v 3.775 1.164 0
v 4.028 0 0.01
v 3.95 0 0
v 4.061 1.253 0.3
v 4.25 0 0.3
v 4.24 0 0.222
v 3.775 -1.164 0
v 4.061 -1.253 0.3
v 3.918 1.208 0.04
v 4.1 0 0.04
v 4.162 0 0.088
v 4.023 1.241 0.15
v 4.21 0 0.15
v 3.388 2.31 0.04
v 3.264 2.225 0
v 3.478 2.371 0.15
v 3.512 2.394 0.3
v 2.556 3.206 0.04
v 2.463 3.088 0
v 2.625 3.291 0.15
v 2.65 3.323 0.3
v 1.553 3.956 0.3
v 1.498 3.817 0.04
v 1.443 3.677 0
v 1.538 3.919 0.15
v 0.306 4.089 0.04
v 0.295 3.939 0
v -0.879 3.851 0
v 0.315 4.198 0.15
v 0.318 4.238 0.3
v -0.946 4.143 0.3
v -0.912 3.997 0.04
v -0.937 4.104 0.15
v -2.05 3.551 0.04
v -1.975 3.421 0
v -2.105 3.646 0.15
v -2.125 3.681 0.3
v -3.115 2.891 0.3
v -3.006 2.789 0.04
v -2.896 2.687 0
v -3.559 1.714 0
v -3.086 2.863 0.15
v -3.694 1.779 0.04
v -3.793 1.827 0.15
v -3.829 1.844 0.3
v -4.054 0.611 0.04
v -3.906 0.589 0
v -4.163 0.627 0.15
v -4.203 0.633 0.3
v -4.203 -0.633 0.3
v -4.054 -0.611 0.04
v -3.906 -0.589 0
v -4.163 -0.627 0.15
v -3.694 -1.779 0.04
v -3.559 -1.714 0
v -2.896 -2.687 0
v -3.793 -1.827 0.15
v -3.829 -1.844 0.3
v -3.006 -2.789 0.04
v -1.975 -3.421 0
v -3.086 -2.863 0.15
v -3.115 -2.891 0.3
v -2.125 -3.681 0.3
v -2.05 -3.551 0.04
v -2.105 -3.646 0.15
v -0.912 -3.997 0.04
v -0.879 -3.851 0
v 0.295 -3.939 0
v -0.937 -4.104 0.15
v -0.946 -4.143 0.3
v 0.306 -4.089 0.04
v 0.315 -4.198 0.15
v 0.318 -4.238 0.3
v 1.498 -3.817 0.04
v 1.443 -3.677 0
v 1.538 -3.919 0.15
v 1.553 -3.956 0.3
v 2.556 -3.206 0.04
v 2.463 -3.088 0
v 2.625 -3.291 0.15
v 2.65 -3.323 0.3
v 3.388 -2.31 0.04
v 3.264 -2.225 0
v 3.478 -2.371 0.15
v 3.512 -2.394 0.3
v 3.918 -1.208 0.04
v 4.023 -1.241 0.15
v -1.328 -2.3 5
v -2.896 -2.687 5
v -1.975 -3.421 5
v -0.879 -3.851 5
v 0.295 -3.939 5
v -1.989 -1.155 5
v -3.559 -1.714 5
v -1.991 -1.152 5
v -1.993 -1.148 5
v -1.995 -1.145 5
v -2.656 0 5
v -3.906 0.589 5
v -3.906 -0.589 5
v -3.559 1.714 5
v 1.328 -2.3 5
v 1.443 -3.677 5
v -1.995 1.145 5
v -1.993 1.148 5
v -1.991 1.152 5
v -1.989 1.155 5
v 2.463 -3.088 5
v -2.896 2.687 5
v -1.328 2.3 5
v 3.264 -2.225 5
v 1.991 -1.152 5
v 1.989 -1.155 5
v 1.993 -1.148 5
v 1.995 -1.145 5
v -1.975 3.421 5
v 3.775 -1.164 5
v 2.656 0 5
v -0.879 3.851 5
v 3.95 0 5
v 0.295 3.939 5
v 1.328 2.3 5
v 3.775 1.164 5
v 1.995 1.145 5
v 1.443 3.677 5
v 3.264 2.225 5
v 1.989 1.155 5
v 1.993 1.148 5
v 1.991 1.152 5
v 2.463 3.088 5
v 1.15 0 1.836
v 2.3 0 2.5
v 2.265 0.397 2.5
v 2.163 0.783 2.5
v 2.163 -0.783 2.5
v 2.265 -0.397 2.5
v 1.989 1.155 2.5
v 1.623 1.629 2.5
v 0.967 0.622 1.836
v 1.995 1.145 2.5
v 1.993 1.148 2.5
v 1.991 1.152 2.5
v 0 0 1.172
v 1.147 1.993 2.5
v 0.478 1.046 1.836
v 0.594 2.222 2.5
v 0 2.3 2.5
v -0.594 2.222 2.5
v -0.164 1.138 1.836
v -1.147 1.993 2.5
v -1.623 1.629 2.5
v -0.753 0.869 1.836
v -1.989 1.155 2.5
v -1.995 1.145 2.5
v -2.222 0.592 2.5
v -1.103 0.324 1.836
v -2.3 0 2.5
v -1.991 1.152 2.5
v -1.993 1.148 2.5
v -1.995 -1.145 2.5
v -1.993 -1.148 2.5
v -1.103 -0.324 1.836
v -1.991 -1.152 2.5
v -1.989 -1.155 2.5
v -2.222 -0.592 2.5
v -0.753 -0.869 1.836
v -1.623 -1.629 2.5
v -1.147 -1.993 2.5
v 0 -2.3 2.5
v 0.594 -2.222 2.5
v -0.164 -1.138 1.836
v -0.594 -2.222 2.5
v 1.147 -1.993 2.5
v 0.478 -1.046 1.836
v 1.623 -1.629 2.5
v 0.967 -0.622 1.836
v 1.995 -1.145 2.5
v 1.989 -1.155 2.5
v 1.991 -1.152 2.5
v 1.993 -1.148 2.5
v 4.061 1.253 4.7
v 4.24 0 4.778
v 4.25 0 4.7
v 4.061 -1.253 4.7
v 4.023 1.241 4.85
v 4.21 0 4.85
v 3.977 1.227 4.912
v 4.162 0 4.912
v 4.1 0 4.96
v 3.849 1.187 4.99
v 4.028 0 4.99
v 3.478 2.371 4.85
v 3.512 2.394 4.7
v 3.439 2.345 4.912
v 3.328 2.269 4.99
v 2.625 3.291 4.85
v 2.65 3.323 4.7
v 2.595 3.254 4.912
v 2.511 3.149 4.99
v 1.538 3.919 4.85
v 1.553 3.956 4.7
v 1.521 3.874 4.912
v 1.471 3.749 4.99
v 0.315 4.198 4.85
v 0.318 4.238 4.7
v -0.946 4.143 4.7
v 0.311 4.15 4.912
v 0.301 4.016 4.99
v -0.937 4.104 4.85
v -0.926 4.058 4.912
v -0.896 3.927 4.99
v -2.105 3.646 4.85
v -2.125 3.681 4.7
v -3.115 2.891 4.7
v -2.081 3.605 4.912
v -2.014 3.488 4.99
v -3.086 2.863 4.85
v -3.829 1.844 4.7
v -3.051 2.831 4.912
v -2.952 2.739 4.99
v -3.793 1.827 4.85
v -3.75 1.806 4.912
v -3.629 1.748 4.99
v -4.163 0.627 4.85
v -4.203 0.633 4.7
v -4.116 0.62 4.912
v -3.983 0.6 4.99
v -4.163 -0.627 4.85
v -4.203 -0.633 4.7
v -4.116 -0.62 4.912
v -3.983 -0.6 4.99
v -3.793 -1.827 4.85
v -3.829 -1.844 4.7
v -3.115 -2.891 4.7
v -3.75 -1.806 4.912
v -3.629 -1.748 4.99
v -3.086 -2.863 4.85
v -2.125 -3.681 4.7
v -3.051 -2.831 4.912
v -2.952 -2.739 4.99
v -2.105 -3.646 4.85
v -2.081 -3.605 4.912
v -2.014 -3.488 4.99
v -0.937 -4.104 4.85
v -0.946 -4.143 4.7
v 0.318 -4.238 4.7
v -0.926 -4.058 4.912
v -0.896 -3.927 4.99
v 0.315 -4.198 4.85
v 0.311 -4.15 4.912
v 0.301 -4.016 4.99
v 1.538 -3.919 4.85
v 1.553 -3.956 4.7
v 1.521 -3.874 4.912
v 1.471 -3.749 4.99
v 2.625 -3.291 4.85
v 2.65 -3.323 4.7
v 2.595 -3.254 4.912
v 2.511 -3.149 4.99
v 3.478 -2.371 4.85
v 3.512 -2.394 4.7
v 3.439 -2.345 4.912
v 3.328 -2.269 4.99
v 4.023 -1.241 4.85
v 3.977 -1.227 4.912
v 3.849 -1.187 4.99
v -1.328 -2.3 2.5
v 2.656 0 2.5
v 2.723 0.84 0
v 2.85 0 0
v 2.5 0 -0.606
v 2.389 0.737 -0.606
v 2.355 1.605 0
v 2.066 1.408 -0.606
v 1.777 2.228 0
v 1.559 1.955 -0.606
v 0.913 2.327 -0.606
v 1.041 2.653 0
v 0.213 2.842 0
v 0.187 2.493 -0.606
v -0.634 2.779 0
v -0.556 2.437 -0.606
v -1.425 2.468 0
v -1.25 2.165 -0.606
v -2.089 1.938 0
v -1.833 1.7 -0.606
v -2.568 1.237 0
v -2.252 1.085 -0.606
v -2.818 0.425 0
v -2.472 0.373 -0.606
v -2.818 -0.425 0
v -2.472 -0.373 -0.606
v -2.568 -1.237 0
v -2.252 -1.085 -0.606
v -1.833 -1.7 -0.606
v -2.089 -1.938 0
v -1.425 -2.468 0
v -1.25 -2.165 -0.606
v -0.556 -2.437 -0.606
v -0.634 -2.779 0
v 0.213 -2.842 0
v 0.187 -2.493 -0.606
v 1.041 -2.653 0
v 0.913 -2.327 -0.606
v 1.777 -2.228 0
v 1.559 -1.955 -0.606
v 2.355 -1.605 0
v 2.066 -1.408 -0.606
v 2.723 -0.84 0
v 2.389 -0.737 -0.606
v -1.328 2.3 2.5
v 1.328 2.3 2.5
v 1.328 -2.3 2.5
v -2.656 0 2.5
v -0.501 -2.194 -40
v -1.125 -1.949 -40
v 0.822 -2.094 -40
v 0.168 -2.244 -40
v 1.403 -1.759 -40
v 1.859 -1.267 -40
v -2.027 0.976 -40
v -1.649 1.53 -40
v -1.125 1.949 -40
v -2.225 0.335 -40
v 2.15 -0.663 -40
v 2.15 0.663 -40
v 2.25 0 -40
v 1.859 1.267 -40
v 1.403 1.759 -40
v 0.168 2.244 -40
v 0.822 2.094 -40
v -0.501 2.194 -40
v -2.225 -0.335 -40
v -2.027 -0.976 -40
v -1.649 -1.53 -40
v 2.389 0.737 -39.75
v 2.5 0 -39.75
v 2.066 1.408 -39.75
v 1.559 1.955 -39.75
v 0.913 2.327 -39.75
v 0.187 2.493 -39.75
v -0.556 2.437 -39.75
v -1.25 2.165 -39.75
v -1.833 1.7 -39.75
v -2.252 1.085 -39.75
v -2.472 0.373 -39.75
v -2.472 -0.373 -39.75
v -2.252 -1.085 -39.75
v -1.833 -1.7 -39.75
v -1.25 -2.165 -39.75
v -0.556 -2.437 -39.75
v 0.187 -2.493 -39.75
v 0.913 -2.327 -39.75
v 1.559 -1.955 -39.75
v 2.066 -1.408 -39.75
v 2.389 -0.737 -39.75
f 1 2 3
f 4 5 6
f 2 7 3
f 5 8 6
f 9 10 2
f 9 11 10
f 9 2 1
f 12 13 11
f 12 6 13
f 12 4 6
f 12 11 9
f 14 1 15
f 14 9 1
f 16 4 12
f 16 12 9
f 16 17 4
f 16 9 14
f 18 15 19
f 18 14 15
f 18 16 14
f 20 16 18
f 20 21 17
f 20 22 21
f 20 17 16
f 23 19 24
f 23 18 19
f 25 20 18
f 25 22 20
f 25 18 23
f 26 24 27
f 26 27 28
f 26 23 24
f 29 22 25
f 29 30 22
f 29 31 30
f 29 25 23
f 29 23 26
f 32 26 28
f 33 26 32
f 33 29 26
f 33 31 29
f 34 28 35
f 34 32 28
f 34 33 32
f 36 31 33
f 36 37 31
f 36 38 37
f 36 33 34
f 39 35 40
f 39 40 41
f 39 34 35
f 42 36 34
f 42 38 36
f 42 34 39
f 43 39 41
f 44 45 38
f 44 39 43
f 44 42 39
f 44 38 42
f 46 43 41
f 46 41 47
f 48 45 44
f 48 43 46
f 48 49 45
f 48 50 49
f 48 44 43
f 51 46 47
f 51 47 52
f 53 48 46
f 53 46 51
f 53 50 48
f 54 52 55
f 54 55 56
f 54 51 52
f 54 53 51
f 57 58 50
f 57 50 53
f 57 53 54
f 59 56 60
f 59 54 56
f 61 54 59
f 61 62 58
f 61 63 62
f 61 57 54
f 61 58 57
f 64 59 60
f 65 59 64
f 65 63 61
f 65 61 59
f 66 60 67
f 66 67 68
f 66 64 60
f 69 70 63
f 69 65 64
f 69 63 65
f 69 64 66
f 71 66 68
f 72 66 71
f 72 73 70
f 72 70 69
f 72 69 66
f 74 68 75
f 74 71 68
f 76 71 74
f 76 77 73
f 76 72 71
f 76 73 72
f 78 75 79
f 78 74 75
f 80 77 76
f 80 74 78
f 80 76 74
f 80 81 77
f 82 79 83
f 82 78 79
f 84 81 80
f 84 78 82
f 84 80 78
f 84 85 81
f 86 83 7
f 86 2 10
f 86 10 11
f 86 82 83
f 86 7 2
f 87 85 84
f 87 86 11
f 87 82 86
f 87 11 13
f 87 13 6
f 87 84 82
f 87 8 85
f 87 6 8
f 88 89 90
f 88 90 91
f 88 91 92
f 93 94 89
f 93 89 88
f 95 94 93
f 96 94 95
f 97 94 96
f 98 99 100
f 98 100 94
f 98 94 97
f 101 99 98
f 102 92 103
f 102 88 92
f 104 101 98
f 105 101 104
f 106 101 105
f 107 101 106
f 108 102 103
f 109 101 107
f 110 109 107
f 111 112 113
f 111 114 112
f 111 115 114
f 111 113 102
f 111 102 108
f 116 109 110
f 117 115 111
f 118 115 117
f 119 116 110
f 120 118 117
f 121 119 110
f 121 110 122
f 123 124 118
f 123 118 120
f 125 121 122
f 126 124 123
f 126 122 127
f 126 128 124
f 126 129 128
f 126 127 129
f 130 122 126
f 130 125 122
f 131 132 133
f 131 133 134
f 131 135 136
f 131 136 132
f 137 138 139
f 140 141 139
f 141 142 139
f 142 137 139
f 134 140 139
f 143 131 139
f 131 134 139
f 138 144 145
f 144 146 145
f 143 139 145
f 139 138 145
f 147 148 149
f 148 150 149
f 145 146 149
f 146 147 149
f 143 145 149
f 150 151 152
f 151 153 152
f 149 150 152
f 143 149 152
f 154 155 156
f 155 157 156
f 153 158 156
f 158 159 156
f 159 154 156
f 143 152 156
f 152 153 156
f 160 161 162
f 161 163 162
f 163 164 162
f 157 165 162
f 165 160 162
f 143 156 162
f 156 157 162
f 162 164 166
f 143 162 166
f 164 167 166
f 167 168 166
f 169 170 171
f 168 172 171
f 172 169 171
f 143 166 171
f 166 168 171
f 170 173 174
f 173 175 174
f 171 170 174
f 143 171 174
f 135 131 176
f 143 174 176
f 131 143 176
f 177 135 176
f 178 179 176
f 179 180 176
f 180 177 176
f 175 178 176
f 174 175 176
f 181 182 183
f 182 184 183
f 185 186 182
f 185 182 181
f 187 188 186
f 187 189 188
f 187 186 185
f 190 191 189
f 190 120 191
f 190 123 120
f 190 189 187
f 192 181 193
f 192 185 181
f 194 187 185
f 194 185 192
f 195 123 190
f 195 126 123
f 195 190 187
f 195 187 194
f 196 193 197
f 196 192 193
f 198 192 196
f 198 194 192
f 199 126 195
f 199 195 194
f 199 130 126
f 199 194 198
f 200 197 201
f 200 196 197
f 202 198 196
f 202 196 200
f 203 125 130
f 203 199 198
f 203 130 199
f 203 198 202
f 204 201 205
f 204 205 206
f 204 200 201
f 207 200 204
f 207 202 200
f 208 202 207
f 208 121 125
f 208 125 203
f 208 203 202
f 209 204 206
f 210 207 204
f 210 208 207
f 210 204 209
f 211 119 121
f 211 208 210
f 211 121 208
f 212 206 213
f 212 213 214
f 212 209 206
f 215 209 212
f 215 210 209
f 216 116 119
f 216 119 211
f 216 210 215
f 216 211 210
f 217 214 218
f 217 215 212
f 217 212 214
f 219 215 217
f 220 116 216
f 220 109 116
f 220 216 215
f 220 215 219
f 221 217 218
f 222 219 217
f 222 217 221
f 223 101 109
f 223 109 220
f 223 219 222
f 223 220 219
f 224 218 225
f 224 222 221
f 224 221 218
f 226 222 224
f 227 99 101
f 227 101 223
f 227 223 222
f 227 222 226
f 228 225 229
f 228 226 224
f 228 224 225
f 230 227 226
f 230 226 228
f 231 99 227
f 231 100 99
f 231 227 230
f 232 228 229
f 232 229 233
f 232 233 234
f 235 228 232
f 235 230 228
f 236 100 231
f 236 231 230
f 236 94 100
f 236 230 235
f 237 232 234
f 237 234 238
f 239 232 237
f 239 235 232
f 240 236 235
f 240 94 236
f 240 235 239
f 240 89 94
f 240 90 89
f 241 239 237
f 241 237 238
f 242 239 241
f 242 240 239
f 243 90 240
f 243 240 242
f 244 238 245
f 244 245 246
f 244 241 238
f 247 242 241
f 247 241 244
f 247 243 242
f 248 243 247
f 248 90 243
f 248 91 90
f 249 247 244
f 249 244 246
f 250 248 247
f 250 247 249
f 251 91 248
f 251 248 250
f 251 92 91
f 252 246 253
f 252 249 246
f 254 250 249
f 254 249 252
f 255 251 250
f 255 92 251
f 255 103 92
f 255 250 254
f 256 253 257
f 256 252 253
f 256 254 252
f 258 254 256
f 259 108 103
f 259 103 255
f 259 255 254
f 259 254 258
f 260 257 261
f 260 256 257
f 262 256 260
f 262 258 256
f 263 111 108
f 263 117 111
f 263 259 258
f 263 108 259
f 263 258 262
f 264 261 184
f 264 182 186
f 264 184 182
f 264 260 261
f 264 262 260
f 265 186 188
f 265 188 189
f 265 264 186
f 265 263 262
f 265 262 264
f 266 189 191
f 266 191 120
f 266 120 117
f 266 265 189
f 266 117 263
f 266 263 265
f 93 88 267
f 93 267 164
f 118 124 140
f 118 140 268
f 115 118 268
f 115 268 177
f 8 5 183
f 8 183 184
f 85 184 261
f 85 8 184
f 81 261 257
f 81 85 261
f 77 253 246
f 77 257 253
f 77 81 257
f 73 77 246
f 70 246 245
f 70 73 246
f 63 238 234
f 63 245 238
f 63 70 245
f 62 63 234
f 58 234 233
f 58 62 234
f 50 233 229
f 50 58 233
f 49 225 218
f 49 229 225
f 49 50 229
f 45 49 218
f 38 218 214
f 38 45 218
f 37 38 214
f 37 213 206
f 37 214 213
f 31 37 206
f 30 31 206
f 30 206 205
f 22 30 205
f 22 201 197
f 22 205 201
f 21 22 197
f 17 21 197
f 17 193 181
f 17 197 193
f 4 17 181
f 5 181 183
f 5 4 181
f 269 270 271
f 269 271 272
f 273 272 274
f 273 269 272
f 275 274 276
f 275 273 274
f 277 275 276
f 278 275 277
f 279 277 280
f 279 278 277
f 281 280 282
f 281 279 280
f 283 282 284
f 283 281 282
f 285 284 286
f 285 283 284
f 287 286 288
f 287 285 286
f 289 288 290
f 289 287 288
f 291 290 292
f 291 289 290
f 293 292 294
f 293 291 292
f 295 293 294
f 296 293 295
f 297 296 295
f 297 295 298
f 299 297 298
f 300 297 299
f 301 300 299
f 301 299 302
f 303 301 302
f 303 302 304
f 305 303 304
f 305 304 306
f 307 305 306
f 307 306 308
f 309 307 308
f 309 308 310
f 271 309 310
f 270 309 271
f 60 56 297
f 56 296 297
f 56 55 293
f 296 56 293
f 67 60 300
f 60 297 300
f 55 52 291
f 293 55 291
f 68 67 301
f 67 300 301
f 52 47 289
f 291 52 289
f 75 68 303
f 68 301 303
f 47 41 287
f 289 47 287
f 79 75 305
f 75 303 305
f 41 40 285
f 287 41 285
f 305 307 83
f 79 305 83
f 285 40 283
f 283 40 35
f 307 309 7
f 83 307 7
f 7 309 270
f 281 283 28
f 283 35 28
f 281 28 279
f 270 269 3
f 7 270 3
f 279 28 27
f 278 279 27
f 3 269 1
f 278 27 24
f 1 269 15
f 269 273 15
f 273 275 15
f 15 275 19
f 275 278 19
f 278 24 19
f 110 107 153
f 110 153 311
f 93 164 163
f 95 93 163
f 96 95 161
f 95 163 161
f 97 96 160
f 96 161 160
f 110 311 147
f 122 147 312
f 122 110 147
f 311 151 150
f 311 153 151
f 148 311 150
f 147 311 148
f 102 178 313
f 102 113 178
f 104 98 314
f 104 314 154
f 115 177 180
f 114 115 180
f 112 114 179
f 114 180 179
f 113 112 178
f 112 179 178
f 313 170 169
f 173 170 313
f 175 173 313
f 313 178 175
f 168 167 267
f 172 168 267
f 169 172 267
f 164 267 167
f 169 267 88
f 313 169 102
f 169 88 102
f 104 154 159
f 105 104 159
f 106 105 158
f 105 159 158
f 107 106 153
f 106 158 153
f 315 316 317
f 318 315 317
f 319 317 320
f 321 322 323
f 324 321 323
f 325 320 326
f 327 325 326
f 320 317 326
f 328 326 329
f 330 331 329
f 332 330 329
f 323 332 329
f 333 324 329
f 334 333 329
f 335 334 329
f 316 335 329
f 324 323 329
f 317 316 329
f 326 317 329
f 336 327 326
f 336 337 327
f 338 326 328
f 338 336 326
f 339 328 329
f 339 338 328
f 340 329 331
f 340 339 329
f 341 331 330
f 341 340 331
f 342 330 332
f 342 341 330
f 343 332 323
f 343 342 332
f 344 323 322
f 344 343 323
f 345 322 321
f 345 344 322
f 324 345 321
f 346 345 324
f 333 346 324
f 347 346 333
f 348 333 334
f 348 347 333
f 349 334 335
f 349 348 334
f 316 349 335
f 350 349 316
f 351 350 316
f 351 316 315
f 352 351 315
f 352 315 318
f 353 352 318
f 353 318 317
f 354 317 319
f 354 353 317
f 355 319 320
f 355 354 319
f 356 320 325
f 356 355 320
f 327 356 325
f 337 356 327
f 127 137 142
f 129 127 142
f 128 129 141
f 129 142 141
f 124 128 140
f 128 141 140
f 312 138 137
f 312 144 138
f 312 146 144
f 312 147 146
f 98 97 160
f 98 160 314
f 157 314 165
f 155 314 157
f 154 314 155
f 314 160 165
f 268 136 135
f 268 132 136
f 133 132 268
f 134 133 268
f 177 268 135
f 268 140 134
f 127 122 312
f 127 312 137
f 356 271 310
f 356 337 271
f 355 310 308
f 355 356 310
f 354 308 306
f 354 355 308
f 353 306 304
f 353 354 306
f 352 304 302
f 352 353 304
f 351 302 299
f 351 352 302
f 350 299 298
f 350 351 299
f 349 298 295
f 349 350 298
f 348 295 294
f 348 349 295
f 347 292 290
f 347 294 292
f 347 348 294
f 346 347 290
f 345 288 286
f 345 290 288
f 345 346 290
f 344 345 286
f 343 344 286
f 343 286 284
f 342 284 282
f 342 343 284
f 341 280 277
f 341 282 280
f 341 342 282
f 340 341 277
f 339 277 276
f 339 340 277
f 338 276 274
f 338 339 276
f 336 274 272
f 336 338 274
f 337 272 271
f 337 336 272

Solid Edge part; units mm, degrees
sketch "Sketch1" plane through (0, 0, 0) normal (0, -1, 0) x (1, 0, 0)
  line L0 (4.25, 5) -> (4.25, 0)
  line L1 (4.25, 0) -> (2.85, 0)
  line L2 (2.85, 0) -> (2.5, -0.6062)
  line L3 (2.5, -0.6062) -> (2.5, -40)
  line L4 (2.5, -40) -> (0, -40)
  line L5 (2.3, 2.5) -> (0, 1.1721)
  line L6 (2.3, 5) -> (2.3, 2.5)
  line L7 (4.25, 5) -> (2.3, 5)
  dimension "D1" = 2.5
  dimension "D2" = 40
  dimension "D3" = 5
revolve "RevolvedProtrusion1" add sketch "Sketch1" angle 360 about axis through (0, 0, -6) along (0, 0, 1)
cosmetic_thread "Thread1" size "M5"
chamfer "Chamfer_1" distance 0.25 angle 45 1 edges at (-2.5, 0, -40)
fillet "Round_1" radius 0.3 2 edges at (-4.25, 0, 0) (-4.25, 0, 5)
sketch "Sketch2" plane through (0, 0, 5) normal (0, 0, 1) x (0, 1, 0)
  line L0 (-2.3, 1.3279) -> (-2.3, -1.3279)
  line L1 (0, -2.6558) -> (-2.3, -1.3279)
  line L2 (2.3, -1.3279) -> (0, -2.6558)
  line L3 (2.3, 1.3279) -> (2.3, -1.3279)
  line L4 (0, 2.6558) -> (2.3, 1.3279)
  line L5 (-2.3, 1.3279) -> (0, 2.6558)
extrude "Cutout1" cut sketch "Sketch2" against normal up to vertex (2.5 mm away)
properties part number "STD-DIN912-M5x40x8.8" material "Galvanized steel"
